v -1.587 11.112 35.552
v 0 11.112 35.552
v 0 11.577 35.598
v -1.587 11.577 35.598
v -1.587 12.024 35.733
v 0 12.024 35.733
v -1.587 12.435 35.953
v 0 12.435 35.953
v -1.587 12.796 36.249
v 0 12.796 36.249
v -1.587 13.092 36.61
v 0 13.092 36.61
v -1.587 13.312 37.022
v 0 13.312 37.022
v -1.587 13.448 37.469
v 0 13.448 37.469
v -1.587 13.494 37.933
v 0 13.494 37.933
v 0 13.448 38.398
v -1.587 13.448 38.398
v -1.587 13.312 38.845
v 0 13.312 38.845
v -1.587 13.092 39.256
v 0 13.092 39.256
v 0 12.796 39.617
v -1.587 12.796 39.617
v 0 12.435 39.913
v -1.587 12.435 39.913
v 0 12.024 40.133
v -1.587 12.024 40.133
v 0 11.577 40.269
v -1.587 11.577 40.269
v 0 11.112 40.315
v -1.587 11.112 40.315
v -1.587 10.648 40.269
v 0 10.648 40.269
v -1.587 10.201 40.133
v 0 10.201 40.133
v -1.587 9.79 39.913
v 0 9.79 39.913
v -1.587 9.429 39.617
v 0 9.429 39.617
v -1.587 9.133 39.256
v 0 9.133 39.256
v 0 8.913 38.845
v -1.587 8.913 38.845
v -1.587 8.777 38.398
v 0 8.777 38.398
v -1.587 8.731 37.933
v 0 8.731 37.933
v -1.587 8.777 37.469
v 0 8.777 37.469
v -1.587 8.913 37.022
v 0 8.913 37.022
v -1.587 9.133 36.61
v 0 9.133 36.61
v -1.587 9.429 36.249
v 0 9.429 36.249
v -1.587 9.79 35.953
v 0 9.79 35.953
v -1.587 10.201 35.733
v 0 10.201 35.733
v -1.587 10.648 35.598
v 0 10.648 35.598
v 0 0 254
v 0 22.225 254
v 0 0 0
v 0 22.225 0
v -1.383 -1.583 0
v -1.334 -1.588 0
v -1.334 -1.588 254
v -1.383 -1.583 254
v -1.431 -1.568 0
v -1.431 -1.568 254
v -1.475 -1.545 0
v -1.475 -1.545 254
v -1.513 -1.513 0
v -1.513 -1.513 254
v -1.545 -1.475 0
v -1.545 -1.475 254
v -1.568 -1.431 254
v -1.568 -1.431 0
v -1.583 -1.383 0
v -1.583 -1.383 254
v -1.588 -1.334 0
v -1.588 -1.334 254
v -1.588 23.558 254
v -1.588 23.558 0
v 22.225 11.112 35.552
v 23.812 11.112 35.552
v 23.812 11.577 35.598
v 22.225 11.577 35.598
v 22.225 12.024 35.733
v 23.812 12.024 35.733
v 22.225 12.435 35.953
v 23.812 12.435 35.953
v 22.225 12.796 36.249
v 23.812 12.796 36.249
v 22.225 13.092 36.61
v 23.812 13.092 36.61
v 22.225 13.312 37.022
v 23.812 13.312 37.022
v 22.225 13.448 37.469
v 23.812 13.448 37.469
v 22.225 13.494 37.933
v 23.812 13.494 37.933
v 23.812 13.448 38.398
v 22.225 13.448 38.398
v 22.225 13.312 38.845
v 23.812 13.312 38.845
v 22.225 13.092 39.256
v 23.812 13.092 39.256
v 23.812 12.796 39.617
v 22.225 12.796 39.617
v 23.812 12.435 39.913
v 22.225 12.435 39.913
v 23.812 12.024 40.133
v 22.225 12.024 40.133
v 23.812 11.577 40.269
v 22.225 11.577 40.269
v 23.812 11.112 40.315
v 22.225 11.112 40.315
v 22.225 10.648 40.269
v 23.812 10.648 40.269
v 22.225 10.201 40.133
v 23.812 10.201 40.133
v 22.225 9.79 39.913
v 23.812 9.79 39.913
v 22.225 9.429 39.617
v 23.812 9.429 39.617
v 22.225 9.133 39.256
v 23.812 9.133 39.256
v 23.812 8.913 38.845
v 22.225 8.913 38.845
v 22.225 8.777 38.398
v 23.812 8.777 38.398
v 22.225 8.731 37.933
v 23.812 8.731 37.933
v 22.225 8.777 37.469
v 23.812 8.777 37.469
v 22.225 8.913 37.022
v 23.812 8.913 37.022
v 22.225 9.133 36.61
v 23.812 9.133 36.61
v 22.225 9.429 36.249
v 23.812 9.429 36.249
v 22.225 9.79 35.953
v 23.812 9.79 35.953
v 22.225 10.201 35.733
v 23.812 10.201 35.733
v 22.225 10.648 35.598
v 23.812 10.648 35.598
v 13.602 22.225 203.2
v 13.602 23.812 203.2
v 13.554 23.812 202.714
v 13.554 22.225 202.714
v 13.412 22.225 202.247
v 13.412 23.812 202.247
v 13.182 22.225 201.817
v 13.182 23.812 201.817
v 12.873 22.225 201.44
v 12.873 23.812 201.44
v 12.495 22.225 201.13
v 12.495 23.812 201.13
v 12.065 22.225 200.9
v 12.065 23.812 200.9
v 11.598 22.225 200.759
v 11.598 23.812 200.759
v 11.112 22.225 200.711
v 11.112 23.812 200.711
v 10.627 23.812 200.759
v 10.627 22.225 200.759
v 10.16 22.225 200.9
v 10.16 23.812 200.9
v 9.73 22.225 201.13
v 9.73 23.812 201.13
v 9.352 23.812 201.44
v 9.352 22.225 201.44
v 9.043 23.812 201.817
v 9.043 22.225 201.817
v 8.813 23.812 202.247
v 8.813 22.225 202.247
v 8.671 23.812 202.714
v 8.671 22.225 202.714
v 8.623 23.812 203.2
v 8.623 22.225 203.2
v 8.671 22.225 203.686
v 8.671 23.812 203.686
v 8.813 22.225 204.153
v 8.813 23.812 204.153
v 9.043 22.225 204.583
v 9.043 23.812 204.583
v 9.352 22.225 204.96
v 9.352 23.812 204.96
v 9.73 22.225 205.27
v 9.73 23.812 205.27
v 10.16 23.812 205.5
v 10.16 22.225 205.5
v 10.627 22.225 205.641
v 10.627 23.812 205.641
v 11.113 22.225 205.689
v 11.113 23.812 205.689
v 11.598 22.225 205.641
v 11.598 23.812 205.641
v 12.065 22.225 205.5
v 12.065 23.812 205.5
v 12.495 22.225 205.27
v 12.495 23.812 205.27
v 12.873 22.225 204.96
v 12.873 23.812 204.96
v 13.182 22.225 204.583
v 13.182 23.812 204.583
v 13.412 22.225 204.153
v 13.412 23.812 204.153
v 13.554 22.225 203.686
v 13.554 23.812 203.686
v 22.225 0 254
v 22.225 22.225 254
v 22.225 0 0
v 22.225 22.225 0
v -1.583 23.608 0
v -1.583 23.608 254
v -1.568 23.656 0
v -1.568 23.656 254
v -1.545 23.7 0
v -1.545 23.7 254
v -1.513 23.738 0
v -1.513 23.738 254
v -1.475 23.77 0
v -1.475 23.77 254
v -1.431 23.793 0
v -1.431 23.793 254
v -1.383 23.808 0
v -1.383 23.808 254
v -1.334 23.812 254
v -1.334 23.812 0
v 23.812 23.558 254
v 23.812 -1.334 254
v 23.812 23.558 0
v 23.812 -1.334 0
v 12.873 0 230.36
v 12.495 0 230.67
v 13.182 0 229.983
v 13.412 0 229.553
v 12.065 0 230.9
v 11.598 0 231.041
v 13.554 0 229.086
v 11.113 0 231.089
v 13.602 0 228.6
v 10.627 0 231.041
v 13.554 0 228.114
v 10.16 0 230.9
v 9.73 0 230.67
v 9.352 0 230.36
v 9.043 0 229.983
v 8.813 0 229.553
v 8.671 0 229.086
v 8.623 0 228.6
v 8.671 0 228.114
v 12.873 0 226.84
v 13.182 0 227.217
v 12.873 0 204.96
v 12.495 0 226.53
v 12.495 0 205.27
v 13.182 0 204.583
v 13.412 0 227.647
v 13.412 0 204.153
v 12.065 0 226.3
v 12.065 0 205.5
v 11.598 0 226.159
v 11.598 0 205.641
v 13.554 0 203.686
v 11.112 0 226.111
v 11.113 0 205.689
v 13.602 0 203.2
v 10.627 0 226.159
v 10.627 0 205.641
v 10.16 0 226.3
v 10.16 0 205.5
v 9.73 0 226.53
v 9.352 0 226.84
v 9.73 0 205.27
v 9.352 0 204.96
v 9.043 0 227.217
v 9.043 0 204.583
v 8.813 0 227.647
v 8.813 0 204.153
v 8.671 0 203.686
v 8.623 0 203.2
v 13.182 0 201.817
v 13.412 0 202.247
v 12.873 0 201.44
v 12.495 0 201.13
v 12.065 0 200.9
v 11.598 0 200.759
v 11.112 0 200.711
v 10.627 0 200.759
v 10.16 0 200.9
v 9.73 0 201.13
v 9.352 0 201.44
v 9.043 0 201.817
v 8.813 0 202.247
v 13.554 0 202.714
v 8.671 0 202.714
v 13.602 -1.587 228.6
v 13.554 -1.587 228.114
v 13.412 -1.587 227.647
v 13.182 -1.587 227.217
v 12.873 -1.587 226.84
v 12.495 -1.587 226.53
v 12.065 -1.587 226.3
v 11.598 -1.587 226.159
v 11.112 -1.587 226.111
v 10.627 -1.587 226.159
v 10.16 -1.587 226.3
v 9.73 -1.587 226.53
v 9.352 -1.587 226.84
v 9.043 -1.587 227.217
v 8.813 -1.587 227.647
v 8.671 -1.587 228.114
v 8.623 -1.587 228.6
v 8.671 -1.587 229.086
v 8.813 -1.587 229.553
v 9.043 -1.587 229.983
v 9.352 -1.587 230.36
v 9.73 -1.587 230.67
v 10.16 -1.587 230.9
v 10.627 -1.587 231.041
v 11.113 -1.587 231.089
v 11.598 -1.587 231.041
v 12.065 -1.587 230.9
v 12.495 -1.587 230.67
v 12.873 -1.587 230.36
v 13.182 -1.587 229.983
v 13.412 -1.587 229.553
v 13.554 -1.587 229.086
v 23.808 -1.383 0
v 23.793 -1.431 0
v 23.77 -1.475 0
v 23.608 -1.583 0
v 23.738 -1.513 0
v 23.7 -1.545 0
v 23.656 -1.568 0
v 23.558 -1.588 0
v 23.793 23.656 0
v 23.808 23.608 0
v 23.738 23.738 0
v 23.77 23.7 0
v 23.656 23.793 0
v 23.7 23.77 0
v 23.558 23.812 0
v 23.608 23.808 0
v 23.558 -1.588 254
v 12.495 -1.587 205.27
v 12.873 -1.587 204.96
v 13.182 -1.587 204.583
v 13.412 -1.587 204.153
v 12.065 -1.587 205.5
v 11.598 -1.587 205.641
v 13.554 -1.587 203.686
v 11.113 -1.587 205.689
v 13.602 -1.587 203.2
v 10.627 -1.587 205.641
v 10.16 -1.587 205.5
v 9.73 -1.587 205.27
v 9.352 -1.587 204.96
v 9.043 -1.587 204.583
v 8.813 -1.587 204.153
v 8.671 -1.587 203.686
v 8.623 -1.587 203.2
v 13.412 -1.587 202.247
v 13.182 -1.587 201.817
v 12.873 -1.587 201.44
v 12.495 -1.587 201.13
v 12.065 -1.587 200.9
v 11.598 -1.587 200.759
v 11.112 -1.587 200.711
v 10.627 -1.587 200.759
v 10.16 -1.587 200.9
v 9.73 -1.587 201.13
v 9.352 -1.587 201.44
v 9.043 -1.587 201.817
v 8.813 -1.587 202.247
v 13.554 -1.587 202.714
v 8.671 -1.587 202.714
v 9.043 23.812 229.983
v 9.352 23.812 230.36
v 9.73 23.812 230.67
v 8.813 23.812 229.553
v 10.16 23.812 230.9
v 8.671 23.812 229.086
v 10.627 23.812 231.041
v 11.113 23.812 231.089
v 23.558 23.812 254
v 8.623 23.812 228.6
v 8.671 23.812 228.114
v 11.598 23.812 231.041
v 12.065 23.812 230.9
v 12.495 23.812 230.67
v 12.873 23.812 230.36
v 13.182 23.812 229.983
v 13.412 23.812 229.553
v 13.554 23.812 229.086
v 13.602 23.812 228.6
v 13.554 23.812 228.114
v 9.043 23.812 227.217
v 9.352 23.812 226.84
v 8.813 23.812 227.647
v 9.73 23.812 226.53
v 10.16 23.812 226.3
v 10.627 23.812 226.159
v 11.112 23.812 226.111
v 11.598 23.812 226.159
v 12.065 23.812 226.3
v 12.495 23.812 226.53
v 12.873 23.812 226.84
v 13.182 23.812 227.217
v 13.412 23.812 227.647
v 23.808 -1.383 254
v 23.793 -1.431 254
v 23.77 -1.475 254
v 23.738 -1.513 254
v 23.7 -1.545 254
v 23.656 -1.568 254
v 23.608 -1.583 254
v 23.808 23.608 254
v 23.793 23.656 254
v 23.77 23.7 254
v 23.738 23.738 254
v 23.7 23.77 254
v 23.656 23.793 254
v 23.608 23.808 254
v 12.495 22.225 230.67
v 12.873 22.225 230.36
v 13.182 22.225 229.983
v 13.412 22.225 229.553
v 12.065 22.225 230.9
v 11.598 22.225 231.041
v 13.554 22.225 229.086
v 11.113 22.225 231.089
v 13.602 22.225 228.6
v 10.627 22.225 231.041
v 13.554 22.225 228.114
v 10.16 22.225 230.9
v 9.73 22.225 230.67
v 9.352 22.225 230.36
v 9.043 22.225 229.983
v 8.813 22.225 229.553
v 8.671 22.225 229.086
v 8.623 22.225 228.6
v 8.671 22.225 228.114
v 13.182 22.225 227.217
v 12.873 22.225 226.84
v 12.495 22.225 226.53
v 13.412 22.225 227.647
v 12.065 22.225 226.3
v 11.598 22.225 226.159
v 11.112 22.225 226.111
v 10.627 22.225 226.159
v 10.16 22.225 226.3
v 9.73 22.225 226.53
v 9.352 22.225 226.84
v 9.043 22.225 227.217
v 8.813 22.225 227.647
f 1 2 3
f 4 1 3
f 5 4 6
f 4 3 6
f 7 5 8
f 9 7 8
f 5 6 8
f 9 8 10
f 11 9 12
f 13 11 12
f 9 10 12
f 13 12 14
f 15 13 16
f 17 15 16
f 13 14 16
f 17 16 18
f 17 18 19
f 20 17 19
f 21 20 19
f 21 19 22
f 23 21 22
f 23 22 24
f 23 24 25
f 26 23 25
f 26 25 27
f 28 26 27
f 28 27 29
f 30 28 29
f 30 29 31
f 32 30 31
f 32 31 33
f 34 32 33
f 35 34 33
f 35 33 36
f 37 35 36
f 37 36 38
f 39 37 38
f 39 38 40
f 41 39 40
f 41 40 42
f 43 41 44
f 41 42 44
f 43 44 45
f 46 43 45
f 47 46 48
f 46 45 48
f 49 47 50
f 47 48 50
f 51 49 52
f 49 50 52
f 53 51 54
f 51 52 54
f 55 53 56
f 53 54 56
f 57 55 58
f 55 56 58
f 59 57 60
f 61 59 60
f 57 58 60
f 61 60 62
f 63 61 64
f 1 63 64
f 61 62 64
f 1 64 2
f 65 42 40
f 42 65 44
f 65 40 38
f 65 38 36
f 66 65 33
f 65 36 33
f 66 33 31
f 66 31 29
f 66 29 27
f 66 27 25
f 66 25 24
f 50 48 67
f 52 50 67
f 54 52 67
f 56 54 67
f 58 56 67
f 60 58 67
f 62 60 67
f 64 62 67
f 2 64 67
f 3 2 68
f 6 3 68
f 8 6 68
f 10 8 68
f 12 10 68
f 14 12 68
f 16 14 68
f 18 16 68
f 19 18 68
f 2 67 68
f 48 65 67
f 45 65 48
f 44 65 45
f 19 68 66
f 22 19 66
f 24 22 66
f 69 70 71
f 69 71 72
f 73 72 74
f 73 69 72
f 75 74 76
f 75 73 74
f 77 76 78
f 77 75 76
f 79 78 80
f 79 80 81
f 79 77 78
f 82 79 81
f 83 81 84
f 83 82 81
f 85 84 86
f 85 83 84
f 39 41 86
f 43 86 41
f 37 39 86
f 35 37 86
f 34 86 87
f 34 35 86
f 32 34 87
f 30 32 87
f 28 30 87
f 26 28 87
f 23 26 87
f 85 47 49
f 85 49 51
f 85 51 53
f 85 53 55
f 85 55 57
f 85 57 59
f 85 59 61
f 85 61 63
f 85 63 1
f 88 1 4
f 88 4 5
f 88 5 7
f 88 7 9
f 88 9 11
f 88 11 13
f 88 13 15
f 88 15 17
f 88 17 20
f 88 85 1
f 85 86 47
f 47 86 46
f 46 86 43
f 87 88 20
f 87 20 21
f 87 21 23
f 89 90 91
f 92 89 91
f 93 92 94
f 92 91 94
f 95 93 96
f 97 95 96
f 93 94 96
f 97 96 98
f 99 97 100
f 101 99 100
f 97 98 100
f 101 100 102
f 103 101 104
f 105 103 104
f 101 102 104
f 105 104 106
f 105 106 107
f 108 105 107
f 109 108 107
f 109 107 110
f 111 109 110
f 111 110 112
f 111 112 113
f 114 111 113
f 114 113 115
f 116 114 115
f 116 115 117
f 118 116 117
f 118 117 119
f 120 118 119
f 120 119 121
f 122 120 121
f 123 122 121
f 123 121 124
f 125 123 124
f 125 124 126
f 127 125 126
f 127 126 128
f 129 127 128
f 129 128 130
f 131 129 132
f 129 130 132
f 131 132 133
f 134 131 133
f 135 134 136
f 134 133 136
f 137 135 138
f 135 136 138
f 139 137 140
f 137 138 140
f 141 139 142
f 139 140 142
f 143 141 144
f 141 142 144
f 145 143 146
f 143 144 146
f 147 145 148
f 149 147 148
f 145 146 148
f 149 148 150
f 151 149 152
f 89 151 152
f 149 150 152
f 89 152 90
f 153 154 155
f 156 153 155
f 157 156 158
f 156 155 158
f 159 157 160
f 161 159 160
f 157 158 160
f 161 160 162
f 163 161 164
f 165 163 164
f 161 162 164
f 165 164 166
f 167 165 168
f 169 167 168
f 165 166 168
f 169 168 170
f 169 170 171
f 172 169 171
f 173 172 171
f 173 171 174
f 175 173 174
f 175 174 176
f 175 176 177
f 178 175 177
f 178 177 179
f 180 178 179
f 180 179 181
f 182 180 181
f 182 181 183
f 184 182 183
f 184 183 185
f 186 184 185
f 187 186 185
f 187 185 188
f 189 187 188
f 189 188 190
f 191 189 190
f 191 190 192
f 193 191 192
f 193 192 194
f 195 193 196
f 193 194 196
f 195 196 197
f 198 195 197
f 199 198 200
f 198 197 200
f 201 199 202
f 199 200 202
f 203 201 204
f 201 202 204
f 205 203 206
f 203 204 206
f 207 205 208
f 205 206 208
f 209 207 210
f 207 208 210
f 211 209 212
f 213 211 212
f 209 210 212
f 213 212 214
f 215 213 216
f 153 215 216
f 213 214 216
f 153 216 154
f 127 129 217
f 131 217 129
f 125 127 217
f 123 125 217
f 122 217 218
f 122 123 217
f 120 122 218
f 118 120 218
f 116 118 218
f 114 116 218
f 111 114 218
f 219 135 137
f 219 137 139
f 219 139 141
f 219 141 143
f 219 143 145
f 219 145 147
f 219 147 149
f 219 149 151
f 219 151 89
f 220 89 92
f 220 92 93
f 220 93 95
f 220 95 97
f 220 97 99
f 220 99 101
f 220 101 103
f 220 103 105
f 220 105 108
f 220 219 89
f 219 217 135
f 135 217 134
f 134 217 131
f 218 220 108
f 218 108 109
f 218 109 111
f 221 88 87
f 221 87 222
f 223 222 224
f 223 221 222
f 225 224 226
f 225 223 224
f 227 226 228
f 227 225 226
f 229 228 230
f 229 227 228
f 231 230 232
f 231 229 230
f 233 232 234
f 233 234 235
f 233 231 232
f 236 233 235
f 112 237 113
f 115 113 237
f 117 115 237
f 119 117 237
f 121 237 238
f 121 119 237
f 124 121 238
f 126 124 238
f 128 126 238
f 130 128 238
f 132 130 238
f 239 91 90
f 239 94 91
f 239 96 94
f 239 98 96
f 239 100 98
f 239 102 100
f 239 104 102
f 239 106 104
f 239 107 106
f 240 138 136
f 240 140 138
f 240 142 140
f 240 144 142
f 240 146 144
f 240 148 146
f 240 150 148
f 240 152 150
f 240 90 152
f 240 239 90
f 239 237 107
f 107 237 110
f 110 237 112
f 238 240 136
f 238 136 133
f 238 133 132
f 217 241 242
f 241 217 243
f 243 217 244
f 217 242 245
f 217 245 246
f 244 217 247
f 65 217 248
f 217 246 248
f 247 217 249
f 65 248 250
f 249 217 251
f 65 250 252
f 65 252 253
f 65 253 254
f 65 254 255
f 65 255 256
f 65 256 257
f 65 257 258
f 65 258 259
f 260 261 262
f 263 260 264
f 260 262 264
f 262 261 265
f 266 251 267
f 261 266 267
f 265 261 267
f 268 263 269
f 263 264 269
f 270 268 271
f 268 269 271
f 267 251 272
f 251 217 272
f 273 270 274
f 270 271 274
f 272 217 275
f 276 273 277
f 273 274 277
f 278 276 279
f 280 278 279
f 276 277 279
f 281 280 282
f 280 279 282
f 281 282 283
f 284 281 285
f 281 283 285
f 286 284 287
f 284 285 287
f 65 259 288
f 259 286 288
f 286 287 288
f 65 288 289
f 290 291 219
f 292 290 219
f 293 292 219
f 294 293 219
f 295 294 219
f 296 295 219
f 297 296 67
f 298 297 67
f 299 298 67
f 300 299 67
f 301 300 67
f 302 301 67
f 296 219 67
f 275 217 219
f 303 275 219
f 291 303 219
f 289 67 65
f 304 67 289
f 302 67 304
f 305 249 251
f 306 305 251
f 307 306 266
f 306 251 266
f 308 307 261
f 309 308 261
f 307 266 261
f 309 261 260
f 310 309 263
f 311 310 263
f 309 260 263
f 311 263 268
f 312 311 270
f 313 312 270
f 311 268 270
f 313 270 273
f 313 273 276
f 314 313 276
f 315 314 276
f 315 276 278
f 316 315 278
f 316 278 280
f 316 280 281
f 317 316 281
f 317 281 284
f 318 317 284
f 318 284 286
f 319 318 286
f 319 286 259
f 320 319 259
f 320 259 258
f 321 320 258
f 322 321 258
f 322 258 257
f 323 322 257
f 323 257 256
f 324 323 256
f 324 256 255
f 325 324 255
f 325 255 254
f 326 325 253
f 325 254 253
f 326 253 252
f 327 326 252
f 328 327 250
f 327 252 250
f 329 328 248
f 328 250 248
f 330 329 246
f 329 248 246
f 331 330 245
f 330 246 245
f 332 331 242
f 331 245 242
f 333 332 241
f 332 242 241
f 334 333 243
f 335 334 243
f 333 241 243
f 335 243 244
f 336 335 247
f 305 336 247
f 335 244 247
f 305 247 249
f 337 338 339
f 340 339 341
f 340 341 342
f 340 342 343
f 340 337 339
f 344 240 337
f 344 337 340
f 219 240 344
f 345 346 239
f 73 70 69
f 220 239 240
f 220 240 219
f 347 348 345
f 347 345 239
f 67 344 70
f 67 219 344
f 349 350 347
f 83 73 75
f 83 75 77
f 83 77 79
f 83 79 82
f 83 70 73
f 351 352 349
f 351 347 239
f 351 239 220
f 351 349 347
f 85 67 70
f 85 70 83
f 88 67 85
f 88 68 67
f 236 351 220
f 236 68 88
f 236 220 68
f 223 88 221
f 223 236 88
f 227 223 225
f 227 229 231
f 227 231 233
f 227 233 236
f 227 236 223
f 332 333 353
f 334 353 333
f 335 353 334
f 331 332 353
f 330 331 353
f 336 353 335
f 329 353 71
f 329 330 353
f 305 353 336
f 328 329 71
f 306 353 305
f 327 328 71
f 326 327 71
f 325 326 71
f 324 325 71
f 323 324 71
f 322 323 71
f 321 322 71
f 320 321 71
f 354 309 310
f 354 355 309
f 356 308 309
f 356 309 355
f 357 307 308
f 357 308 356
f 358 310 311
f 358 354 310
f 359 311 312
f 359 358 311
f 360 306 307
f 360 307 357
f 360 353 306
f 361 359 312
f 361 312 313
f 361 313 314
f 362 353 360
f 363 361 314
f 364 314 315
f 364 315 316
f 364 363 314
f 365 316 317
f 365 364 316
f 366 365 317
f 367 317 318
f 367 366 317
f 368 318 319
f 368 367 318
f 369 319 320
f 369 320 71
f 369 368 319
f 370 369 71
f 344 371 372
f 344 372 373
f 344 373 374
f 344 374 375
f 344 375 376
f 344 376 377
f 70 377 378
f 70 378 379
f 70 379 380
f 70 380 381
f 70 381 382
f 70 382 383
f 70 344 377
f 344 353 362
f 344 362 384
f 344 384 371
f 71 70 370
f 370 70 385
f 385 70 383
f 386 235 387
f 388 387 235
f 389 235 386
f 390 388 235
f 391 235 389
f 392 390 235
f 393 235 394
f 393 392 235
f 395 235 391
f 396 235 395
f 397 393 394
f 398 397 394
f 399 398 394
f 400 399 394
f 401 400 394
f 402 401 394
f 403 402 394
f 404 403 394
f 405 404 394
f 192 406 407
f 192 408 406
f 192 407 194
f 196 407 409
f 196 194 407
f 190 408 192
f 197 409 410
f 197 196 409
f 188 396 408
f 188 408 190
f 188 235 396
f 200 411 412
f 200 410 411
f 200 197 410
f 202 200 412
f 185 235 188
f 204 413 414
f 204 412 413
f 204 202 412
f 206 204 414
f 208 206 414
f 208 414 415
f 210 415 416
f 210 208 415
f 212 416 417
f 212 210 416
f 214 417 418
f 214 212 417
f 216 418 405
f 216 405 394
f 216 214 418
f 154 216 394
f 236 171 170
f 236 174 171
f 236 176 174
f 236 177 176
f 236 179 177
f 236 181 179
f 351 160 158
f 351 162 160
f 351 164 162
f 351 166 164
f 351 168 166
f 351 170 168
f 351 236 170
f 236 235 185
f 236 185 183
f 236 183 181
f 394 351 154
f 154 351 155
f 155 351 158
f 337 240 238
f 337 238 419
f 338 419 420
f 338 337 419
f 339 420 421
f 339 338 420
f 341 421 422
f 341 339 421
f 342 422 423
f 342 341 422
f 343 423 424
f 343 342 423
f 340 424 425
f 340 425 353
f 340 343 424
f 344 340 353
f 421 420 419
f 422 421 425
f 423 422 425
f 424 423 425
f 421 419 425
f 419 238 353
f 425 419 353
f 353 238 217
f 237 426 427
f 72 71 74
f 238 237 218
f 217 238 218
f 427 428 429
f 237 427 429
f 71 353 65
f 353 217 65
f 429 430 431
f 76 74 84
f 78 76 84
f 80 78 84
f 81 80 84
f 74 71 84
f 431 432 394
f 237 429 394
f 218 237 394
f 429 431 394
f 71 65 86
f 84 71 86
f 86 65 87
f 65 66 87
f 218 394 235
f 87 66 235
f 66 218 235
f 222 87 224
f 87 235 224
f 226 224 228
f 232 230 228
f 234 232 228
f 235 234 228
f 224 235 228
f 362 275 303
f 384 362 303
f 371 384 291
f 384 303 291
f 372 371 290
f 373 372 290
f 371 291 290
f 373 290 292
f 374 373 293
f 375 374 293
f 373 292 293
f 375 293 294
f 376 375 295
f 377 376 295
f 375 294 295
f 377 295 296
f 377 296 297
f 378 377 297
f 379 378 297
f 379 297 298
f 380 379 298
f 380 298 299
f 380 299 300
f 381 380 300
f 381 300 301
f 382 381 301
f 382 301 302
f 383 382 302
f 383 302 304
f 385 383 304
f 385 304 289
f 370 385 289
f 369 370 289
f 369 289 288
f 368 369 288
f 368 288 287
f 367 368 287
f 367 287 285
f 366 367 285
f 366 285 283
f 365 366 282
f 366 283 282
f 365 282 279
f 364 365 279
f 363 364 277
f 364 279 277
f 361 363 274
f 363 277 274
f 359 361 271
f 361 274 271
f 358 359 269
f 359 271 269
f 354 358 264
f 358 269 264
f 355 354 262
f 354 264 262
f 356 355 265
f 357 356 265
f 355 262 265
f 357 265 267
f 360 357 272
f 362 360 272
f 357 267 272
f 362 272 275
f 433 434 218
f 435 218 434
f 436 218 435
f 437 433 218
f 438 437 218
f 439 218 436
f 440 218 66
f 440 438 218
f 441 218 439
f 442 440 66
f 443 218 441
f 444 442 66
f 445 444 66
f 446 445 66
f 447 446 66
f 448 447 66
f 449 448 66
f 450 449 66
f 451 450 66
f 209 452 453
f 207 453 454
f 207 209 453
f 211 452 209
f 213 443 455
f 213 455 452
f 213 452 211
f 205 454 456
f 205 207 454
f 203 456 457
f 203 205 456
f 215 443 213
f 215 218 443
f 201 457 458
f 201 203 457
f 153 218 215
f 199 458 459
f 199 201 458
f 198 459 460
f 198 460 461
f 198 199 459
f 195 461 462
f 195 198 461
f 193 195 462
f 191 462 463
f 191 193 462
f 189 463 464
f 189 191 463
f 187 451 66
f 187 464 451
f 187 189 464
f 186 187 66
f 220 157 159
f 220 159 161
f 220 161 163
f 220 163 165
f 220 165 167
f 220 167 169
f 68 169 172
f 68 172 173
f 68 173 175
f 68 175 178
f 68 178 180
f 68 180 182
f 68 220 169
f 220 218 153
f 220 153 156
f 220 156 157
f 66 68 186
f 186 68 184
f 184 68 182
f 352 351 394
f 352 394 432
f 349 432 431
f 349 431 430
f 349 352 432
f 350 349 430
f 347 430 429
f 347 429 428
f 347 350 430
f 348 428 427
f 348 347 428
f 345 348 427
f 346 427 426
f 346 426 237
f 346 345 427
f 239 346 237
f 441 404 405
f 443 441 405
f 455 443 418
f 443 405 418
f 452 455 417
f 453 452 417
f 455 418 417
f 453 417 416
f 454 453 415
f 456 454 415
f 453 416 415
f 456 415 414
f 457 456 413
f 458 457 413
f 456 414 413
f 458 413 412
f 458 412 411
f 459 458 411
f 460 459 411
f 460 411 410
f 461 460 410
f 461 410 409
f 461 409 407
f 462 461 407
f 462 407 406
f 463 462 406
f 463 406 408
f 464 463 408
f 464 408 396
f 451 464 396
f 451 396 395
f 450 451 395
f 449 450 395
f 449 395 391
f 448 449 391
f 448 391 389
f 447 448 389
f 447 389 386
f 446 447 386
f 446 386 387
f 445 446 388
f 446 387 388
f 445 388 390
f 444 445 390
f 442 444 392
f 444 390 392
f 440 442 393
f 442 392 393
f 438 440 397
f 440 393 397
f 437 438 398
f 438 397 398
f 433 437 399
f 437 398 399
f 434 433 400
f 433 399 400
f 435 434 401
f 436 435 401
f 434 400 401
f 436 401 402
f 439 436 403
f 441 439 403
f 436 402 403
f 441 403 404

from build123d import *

# Parameters (mm, degrees)
SKETCH1_W           = 22.225
SKETCH1_H           = 22.225
BOSS_EXTRUDE1_DEPTH = 254
SKETCH4_R           = 2.38125
CUT_EXTRUDE2_DEPTH  = 26.4
SKETCH6_R           = 2.4892
CUT_EXTRUDE3_DEPTH  = 25.4


with BuildPart() as part:
    # Sketch1 → Boss-Extrude1 (new body)
    with BuildSketch(Plane(origin=(0, 0, 0), x_dir=(-1, 0, 0), z_dir=(0, 0, -1))):
        with BuildLine():
            Line((1.5875, -1.3335), (1.5875, 23.5585))
            ThreePointArc((1.5875, 23.5585), (1.513105122, 23.738105122), (1.3335, 23.8125))
            Line((1.3335, 23.8125), (-23.5585, 23.8125))
            ThreePointArc((-23.5585, 23.8125), (-23.738105122, 23.738105122), (-23.8125, 23.5585))
            Line((-23.8125, 23.5585), (-23.8125, -1.3335))
            ThreePointArc((-23.8125, -1.3335), (-23.738105122, -1.513105122), (-23.5585, -1.5875))
            Line((-23.5585, -1.5875), (1.3335, -1.5875))
            ThreePointArc((1.3335, -1.5875), (1.513105122, -1.513105122), (1.5875, -1.3335))
        make_face()
        with Locations((-11.1125, 11.1125)):
            Rectangle(SKETCH1_W, SKETCH1_H, mode=Mode.SUBTRACT)
    extrude(amount=-BOSS_EXTRUDE1_DEPTH)

    # Sketch4 → Cut-Extrude2 (cut, through all)
    with BuildSketch(Plane(origin=(23.8125, 0, 0), x_dir=(0, 0, -1), z_dir=(1, 0, 0))):
        with Locations((-37.933268304, 11.1125)):
            Circle(SKETCH4_R)
    extrude(amount=-CUT_EXTRUDE2_DEPTH, mode=Mode.SUBTRACT)

    # Sketch6 → Cut-Extrude3 (cut)
    with BuildSketch(Plane(origin=(0, 23.8125, 0), x_dir=(1, 0, 0), z_dir=(0, 1, 0))):
        with Locations((11.1125, -203.2)):
            Circle(SKETCH6_R)
        with Locations((11.1125, -228.6)):
            Circle(SKETCH6_R)
    extrude(amount=-CUT_EXTRUDE3_DEPTH, mode=Mode.SUBTRACT)


solid = part.part
